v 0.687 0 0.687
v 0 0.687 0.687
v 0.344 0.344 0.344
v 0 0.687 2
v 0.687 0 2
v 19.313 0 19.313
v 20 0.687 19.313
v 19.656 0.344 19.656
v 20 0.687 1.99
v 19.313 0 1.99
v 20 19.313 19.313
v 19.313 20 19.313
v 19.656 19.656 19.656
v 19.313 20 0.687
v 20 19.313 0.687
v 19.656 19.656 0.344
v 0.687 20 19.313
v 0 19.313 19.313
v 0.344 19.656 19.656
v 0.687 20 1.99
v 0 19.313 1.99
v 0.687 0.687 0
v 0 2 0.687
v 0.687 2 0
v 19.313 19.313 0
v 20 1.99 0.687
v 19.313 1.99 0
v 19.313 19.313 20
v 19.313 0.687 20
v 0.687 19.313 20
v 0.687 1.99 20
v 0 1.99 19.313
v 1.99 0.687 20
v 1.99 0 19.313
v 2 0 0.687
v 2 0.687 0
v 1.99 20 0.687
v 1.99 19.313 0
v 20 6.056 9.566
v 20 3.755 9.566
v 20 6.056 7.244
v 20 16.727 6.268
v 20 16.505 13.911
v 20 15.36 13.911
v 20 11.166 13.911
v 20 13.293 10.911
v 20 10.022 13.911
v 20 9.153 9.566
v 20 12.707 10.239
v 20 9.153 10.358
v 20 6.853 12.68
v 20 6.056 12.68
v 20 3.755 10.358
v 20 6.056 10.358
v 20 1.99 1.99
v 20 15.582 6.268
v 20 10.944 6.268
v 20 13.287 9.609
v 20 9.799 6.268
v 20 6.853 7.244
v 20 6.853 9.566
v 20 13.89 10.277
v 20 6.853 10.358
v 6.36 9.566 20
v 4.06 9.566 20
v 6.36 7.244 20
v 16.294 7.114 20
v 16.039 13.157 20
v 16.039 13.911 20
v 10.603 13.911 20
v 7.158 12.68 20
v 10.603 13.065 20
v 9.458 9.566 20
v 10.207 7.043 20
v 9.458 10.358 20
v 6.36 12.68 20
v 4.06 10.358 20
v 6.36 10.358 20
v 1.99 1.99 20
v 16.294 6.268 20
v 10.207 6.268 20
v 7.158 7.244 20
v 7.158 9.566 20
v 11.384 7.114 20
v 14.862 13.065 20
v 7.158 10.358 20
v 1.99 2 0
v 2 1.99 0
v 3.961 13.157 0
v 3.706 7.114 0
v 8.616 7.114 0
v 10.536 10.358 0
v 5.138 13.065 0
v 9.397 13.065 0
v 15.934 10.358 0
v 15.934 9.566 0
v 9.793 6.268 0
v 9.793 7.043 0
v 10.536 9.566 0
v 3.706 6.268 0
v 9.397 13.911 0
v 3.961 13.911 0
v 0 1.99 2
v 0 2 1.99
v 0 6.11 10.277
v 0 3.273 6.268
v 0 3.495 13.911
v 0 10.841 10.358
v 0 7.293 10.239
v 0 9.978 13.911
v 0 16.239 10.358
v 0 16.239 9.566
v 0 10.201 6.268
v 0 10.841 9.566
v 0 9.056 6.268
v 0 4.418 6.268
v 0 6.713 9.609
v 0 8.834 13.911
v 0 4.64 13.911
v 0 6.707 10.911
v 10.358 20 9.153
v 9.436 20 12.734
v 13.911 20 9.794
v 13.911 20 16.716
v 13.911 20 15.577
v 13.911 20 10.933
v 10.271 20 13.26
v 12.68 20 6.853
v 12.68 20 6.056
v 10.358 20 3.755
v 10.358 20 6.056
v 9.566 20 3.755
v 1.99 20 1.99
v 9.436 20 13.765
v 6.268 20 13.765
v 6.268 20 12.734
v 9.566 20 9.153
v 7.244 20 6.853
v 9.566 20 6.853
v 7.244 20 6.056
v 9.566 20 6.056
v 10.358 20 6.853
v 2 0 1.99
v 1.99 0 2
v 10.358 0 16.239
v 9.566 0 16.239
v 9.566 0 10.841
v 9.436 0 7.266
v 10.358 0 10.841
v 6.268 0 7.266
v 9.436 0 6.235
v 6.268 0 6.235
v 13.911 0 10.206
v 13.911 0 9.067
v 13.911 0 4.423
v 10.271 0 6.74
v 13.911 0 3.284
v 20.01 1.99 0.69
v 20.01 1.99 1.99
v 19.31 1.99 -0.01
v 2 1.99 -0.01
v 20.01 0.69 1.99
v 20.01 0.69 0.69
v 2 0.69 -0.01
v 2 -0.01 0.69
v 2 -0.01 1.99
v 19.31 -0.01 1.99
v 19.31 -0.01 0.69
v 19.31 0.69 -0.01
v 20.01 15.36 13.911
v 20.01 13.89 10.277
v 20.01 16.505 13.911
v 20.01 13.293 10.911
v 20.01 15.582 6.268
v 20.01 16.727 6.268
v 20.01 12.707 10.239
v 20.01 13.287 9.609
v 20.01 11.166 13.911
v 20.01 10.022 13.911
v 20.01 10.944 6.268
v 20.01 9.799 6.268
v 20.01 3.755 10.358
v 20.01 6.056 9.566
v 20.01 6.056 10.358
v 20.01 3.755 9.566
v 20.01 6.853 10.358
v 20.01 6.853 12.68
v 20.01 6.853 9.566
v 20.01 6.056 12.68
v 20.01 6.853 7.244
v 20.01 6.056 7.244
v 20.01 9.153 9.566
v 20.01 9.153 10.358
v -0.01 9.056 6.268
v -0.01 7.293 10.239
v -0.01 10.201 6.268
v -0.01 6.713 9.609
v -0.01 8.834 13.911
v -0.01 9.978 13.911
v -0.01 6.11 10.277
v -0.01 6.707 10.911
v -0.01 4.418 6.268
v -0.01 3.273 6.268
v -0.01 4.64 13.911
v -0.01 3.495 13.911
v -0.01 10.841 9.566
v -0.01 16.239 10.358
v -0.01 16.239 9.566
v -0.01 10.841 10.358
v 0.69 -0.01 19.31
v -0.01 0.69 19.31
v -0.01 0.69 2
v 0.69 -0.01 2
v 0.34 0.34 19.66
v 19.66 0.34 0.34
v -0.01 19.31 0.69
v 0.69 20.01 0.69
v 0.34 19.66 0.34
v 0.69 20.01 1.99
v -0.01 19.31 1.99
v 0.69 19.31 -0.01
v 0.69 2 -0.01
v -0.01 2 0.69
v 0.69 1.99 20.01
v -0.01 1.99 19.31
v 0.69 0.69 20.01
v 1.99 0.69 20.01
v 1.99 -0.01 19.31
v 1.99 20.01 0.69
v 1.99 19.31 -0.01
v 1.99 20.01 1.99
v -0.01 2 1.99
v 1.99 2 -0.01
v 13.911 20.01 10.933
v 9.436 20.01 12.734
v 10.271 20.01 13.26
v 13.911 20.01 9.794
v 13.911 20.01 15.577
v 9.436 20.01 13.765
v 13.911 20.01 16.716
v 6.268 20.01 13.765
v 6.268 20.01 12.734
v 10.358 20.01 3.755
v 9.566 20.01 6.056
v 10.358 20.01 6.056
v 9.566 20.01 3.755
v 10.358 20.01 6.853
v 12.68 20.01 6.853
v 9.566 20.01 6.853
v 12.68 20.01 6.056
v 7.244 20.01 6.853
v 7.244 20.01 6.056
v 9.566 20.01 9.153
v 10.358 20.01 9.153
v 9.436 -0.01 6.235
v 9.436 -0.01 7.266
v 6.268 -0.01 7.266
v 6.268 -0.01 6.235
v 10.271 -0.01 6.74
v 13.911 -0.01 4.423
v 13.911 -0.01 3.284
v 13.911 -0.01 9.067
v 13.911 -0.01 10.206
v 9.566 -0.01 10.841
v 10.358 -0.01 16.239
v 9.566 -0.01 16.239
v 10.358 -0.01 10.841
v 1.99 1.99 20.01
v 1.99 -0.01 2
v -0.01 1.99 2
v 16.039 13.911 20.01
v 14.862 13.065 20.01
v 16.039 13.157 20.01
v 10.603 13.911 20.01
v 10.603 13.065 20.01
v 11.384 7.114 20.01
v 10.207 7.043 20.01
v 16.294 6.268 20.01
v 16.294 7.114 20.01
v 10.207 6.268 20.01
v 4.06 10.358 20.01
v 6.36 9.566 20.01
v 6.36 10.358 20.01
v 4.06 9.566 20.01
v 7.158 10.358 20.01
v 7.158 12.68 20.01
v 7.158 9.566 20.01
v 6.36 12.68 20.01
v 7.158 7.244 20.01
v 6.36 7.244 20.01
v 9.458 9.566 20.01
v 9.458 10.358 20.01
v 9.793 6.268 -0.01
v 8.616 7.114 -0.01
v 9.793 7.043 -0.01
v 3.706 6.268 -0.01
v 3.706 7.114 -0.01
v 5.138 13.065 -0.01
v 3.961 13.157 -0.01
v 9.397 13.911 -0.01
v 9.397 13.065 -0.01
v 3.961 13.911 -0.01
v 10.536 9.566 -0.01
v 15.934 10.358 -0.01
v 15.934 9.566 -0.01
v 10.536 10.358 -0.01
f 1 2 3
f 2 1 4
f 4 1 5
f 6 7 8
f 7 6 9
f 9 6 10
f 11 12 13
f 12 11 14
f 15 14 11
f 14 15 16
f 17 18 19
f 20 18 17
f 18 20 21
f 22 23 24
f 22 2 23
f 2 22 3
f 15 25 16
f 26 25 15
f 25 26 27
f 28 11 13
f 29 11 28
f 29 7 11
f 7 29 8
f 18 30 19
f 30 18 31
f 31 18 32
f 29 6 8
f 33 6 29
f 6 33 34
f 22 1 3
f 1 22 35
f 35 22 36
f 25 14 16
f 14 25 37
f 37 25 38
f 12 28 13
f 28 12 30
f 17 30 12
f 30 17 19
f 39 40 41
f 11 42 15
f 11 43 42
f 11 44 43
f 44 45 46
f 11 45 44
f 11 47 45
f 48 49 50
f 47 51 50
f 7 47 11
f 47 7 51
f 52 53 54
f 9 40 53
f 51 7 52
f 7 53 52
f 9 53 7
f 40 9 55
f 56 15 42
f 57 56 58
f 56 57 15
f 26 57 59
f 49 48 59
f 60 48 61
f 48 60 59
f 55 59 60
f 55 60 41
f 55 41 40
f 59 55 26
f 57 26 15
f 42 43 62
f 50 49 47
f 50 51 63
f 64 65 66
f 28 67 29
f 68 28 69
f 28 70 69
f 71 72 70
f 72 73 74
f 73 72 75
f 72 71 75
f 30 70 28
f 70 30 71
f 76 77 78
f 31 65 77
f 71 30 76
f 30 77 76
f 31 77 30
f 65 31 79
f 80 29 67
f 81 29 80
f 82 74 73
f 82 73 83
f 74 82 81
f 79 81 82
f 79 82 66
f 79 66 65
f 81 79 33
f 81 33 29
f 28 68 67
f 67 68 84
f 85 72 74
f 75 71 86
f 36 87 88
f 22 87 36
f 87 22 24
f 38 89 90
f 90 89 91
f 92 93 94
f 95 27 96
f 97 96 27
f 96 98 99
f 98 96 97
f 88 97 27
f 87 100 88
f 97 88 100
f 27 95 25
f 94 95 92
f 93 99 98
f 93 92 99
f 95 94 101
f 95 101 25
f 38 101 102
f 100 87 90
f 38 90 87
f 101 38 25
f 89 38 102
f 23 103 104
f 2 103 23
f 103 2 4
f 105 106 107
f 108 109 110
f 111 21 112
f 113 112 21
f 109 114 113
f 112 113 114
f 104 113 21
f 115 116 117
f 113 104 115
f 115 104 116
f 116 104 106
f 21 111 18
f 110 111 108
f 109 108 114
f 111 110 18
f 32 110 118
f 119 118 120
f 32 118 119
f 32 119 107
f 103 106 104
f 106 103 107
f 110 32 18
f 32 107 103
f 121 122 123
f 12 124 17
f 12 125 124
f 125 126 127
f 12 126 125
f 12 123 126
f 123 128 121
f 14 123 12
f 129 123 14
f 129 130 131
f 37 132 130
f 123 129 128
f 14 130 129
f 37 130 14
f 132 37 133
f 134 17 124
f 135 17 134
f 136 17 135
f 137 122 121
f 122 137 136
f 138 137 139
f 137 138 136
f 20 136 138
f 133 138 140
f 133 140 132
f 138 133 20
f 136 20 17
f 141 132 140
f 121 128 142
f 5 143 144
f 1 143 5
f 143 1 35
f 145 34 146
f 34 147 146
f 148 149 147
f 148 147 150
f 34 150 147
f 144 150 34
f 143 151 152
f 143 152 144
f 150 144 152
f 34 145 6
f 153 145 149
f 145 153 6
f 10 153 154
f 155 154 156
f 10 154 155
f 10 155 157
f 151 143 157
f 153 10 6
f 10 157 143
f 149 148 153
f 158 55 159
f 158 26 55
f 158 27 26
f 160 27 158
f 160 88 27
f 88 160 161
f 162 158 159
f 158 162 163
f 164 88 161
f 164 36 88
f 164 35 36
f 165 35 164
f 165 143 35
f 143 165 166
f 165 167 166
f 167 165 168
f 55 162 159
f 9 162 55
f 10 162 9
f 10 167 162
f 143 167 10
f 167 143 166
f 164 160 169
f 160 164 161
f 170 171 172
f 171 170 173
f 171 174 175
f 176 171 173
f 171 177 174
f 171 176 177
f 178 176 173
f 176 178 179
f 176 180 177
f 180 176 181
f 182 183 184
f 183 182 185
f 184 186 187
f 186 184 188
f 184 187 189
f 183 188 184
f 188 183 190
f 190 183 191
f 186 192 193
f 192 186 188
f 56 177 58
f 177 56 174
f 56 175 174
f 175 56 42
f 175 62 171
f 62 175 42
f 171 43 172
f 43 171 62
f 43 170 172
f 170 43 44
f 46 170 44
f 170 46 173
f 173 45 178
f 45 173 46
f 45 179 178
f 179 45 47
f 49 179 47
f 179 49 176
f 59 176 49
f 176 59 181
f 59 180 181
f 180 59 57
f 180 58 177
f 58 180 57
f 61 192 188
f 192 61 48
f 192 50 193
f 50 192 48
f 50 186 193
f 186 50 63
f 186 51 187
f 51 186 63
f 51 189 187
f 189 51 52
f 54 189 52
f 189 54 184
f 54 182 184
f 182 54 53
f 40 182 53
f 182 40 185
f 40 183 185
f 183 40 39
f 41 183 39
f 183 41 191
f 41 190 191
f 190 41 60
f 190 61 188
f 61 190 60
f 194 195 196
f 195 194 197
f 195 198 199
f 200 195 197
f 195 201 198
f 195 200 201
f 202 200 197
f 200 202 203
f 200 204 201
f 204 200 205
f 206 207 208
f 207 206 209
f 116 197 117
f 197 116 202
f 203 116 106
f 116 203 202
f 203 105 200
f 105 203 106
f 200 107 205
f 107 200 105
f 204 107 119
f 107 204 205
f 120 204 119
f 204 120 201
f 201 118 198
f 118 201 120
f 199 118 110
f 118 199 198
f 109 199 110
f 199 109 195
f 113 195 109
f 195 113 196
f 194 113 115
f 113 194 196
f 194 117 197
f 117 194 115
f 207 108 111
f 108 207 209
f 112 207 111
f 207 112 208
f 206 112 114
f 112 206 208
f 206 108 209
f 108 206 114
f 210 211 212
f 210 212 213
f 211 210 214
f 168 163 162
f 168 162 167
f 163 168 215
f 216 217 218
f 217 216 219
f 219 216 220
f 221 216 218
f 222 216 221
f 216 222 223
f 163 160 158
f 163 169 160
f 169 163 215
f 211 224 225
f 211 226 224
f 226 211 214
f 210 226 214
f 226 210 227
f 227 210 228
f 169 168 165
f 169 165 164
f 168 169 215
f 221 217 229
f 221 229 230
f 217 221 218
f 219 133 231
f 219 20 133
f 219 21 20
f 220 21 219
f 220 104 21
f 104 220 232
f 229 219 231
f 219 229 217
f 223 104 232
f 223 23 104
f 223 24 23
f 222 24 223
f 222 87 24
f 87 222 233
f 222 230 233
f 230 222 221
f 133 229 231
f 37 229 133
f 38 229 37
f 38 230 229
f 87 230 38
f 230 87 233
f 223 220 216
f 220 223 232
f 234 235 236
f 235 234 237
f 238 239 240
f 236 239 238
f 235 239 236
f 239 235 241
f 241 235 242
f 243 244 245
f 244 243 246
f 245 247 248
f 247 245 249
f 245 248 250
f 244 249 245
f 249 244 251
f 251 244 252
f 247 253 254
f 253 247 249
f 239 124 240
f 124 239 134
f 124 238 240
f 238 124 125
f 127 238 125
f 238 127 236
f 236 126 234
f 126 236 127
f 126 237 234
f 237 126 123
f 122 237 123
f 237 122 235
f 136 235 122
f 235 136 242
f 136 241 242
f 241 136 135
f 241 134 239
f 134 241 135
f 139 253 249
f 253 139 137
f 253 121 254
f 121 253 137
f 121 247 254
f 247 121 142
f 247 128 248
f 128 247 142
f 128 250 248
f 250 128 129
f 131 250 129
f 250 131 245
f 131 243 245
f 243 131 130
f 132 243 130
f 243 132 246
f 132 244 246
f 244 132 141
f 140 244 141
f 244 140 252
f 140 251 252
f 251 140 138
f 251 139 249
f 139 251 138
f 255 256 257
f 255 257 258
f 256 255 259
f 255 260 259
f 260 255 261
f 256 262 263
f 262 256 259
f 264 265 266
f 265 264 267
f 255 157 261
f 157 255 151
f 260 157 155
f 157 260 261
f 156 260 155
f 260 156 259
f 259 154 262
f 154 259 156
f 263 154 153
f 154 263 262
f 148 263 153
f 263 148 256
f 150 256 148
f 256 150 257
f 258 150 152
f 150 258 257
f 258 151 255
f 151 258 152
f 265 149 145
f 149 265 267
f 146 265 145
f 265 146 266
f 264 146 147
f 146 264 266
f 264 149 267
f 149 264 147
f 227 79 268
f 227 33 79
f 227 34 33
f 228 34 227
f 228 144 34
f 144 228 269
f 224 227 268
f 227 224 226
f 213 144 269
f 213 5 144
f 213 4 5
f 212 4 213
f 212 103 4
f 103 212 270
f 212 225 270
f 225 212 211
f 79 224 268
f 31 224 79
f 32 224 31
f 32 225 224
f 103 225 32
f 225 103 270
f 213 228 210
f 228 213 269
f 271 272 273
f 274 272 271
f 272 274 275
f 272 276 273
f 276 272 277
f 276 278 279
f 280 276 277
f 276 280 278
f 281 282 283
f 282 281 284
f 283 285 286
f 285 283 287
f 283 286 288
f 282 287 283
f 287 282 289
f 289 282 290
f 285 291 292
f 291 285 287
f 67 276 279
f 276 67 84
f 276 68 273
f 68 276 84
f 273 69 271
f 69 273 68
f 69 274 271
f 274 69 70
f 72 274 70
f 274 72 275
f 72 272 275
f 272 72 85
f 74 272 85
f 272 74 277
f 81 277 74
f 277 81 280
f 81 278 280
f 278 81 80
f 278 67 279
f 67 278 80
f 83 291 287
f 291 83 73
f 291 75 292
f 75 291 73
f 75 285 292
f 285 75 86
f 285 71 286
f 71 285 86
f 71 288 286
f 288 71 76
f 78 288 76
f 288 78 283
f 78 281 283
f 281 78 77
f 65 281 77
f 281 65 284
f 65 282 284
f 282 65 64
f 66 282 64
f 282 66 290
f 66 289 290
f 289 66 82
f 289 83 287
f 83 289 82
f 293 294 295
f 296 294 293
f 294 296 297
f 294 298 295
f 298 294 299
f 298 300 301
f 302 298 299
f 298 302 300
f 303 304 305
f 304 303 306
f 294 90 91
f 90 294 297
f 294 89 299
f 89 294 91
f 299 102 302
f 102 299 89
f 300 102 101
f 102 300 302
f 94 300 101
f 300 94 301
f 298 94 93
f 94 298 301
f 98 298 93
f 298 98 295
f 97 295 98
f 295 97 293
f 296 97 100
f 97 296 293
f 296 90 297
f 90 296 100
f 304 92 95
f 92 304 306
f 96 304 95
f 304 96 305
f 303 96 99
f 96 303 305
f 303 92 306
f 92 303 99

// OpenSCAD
part = "preview";

cube_size = 20;
left_handed = false;
axis_thickness = 2;
text_thickness = 1.6;
bevel_size = 1;

epsilon = 0.01;

if (part == "preview") preview();
else if (part == "n") neutral();
else if (part == "x") x_features();
else if (part == "y") y_features();
else if (part == "z") z_features();


module preview() {
    color("white") neutral();
    color("red") x_features();
    color("green") y_features();
    color("blue") z_features();
}


module neutral() {
    difference() {
        body_without_features();
        
        x_features();
        y_features();
        z_features();
    }
}

module body_without_features() {
    overall_bounds(false) {
        cube([1, 1, 1] * cube_size);
    }
}

module x_features() {
    overall_bounds(true) {
        nominal_x_transform()
        axis_bar_and_label("X");
    }
}

module y_features() {
    overall_bounds(true) {
        nominal_y_transform()
        axis_bar_and_label("Y");
    }
}

module z_features() {
    overall_bounds(true) {
        axis_bar_and_label("Z");
    }
}

module overall_bounds(fudge = false) {
    difference() {
        children();
        
        $bevel_fudge = fudge;
        translate([1, 1, 1] * (cube_size / 2))
        twelve_bevels();
    }
}

module nominal_x_transform() {
    if (left_handed) {
        y_transform() children();
    } else {
        x_transform() children();
    }
}

module nominal_y_transform() {
    if (left_handed) {
        x_transform() children();
    } else {
        y_transform() children();
    }
}

module x_transform() {
    rotate([90, 0, 0])
    rotate([0, 90, 0])
    children();
}

module y_transform() {
    rotate([-90, 0, 0])
    rotate([0, 0, -90])
    children();
}

module axis_bar_and_label(axis) {
    axis_bar();
    
    one_label(str("+", axis), true);
    one_label(str("\u2212", axis), false);
}

module one_label(string, topside) {
    translate([1, 1, 1] * (cube_size / 2))
    rotate([0, topside ? 0 : 180, 0])
    translate([
        0,
        0,
        cube_size / 2 - text_thickness + epsilon])
    linear_extrude(text_thickness)
    text(string, 
        size=cube_size * 0.4,
        halign="center",
        valign="center");
}

module axis_bar() {
    translate([-epsilon, -epsilon, axis_thickness])
    cube([axis_thickness, axis_thickness, cube_size - axis_thickness + epsilon]);
}

module twelve_bevels() {
    four_bevels();
    rotate([90, 0, 0]) four_bevels();
    rotate([0, 90, 0]) four_bevels();
}

module four_bevels() {
    for (angle = [0:90:360]) {
        rotate([0, 0, angle])
        one_bevel();
    }
}

module one_bevel() {
    size = bevel_size - ($bevel_fudge ? epsilon : 0);
    translate([-cube_size / 2 - epsilon, -cube_size / 2 - epsilon, 0])
    rotate([0, 0, 45])
    cube([size, size, cube_size * 2 + epsilon * 4], center=true);
}
